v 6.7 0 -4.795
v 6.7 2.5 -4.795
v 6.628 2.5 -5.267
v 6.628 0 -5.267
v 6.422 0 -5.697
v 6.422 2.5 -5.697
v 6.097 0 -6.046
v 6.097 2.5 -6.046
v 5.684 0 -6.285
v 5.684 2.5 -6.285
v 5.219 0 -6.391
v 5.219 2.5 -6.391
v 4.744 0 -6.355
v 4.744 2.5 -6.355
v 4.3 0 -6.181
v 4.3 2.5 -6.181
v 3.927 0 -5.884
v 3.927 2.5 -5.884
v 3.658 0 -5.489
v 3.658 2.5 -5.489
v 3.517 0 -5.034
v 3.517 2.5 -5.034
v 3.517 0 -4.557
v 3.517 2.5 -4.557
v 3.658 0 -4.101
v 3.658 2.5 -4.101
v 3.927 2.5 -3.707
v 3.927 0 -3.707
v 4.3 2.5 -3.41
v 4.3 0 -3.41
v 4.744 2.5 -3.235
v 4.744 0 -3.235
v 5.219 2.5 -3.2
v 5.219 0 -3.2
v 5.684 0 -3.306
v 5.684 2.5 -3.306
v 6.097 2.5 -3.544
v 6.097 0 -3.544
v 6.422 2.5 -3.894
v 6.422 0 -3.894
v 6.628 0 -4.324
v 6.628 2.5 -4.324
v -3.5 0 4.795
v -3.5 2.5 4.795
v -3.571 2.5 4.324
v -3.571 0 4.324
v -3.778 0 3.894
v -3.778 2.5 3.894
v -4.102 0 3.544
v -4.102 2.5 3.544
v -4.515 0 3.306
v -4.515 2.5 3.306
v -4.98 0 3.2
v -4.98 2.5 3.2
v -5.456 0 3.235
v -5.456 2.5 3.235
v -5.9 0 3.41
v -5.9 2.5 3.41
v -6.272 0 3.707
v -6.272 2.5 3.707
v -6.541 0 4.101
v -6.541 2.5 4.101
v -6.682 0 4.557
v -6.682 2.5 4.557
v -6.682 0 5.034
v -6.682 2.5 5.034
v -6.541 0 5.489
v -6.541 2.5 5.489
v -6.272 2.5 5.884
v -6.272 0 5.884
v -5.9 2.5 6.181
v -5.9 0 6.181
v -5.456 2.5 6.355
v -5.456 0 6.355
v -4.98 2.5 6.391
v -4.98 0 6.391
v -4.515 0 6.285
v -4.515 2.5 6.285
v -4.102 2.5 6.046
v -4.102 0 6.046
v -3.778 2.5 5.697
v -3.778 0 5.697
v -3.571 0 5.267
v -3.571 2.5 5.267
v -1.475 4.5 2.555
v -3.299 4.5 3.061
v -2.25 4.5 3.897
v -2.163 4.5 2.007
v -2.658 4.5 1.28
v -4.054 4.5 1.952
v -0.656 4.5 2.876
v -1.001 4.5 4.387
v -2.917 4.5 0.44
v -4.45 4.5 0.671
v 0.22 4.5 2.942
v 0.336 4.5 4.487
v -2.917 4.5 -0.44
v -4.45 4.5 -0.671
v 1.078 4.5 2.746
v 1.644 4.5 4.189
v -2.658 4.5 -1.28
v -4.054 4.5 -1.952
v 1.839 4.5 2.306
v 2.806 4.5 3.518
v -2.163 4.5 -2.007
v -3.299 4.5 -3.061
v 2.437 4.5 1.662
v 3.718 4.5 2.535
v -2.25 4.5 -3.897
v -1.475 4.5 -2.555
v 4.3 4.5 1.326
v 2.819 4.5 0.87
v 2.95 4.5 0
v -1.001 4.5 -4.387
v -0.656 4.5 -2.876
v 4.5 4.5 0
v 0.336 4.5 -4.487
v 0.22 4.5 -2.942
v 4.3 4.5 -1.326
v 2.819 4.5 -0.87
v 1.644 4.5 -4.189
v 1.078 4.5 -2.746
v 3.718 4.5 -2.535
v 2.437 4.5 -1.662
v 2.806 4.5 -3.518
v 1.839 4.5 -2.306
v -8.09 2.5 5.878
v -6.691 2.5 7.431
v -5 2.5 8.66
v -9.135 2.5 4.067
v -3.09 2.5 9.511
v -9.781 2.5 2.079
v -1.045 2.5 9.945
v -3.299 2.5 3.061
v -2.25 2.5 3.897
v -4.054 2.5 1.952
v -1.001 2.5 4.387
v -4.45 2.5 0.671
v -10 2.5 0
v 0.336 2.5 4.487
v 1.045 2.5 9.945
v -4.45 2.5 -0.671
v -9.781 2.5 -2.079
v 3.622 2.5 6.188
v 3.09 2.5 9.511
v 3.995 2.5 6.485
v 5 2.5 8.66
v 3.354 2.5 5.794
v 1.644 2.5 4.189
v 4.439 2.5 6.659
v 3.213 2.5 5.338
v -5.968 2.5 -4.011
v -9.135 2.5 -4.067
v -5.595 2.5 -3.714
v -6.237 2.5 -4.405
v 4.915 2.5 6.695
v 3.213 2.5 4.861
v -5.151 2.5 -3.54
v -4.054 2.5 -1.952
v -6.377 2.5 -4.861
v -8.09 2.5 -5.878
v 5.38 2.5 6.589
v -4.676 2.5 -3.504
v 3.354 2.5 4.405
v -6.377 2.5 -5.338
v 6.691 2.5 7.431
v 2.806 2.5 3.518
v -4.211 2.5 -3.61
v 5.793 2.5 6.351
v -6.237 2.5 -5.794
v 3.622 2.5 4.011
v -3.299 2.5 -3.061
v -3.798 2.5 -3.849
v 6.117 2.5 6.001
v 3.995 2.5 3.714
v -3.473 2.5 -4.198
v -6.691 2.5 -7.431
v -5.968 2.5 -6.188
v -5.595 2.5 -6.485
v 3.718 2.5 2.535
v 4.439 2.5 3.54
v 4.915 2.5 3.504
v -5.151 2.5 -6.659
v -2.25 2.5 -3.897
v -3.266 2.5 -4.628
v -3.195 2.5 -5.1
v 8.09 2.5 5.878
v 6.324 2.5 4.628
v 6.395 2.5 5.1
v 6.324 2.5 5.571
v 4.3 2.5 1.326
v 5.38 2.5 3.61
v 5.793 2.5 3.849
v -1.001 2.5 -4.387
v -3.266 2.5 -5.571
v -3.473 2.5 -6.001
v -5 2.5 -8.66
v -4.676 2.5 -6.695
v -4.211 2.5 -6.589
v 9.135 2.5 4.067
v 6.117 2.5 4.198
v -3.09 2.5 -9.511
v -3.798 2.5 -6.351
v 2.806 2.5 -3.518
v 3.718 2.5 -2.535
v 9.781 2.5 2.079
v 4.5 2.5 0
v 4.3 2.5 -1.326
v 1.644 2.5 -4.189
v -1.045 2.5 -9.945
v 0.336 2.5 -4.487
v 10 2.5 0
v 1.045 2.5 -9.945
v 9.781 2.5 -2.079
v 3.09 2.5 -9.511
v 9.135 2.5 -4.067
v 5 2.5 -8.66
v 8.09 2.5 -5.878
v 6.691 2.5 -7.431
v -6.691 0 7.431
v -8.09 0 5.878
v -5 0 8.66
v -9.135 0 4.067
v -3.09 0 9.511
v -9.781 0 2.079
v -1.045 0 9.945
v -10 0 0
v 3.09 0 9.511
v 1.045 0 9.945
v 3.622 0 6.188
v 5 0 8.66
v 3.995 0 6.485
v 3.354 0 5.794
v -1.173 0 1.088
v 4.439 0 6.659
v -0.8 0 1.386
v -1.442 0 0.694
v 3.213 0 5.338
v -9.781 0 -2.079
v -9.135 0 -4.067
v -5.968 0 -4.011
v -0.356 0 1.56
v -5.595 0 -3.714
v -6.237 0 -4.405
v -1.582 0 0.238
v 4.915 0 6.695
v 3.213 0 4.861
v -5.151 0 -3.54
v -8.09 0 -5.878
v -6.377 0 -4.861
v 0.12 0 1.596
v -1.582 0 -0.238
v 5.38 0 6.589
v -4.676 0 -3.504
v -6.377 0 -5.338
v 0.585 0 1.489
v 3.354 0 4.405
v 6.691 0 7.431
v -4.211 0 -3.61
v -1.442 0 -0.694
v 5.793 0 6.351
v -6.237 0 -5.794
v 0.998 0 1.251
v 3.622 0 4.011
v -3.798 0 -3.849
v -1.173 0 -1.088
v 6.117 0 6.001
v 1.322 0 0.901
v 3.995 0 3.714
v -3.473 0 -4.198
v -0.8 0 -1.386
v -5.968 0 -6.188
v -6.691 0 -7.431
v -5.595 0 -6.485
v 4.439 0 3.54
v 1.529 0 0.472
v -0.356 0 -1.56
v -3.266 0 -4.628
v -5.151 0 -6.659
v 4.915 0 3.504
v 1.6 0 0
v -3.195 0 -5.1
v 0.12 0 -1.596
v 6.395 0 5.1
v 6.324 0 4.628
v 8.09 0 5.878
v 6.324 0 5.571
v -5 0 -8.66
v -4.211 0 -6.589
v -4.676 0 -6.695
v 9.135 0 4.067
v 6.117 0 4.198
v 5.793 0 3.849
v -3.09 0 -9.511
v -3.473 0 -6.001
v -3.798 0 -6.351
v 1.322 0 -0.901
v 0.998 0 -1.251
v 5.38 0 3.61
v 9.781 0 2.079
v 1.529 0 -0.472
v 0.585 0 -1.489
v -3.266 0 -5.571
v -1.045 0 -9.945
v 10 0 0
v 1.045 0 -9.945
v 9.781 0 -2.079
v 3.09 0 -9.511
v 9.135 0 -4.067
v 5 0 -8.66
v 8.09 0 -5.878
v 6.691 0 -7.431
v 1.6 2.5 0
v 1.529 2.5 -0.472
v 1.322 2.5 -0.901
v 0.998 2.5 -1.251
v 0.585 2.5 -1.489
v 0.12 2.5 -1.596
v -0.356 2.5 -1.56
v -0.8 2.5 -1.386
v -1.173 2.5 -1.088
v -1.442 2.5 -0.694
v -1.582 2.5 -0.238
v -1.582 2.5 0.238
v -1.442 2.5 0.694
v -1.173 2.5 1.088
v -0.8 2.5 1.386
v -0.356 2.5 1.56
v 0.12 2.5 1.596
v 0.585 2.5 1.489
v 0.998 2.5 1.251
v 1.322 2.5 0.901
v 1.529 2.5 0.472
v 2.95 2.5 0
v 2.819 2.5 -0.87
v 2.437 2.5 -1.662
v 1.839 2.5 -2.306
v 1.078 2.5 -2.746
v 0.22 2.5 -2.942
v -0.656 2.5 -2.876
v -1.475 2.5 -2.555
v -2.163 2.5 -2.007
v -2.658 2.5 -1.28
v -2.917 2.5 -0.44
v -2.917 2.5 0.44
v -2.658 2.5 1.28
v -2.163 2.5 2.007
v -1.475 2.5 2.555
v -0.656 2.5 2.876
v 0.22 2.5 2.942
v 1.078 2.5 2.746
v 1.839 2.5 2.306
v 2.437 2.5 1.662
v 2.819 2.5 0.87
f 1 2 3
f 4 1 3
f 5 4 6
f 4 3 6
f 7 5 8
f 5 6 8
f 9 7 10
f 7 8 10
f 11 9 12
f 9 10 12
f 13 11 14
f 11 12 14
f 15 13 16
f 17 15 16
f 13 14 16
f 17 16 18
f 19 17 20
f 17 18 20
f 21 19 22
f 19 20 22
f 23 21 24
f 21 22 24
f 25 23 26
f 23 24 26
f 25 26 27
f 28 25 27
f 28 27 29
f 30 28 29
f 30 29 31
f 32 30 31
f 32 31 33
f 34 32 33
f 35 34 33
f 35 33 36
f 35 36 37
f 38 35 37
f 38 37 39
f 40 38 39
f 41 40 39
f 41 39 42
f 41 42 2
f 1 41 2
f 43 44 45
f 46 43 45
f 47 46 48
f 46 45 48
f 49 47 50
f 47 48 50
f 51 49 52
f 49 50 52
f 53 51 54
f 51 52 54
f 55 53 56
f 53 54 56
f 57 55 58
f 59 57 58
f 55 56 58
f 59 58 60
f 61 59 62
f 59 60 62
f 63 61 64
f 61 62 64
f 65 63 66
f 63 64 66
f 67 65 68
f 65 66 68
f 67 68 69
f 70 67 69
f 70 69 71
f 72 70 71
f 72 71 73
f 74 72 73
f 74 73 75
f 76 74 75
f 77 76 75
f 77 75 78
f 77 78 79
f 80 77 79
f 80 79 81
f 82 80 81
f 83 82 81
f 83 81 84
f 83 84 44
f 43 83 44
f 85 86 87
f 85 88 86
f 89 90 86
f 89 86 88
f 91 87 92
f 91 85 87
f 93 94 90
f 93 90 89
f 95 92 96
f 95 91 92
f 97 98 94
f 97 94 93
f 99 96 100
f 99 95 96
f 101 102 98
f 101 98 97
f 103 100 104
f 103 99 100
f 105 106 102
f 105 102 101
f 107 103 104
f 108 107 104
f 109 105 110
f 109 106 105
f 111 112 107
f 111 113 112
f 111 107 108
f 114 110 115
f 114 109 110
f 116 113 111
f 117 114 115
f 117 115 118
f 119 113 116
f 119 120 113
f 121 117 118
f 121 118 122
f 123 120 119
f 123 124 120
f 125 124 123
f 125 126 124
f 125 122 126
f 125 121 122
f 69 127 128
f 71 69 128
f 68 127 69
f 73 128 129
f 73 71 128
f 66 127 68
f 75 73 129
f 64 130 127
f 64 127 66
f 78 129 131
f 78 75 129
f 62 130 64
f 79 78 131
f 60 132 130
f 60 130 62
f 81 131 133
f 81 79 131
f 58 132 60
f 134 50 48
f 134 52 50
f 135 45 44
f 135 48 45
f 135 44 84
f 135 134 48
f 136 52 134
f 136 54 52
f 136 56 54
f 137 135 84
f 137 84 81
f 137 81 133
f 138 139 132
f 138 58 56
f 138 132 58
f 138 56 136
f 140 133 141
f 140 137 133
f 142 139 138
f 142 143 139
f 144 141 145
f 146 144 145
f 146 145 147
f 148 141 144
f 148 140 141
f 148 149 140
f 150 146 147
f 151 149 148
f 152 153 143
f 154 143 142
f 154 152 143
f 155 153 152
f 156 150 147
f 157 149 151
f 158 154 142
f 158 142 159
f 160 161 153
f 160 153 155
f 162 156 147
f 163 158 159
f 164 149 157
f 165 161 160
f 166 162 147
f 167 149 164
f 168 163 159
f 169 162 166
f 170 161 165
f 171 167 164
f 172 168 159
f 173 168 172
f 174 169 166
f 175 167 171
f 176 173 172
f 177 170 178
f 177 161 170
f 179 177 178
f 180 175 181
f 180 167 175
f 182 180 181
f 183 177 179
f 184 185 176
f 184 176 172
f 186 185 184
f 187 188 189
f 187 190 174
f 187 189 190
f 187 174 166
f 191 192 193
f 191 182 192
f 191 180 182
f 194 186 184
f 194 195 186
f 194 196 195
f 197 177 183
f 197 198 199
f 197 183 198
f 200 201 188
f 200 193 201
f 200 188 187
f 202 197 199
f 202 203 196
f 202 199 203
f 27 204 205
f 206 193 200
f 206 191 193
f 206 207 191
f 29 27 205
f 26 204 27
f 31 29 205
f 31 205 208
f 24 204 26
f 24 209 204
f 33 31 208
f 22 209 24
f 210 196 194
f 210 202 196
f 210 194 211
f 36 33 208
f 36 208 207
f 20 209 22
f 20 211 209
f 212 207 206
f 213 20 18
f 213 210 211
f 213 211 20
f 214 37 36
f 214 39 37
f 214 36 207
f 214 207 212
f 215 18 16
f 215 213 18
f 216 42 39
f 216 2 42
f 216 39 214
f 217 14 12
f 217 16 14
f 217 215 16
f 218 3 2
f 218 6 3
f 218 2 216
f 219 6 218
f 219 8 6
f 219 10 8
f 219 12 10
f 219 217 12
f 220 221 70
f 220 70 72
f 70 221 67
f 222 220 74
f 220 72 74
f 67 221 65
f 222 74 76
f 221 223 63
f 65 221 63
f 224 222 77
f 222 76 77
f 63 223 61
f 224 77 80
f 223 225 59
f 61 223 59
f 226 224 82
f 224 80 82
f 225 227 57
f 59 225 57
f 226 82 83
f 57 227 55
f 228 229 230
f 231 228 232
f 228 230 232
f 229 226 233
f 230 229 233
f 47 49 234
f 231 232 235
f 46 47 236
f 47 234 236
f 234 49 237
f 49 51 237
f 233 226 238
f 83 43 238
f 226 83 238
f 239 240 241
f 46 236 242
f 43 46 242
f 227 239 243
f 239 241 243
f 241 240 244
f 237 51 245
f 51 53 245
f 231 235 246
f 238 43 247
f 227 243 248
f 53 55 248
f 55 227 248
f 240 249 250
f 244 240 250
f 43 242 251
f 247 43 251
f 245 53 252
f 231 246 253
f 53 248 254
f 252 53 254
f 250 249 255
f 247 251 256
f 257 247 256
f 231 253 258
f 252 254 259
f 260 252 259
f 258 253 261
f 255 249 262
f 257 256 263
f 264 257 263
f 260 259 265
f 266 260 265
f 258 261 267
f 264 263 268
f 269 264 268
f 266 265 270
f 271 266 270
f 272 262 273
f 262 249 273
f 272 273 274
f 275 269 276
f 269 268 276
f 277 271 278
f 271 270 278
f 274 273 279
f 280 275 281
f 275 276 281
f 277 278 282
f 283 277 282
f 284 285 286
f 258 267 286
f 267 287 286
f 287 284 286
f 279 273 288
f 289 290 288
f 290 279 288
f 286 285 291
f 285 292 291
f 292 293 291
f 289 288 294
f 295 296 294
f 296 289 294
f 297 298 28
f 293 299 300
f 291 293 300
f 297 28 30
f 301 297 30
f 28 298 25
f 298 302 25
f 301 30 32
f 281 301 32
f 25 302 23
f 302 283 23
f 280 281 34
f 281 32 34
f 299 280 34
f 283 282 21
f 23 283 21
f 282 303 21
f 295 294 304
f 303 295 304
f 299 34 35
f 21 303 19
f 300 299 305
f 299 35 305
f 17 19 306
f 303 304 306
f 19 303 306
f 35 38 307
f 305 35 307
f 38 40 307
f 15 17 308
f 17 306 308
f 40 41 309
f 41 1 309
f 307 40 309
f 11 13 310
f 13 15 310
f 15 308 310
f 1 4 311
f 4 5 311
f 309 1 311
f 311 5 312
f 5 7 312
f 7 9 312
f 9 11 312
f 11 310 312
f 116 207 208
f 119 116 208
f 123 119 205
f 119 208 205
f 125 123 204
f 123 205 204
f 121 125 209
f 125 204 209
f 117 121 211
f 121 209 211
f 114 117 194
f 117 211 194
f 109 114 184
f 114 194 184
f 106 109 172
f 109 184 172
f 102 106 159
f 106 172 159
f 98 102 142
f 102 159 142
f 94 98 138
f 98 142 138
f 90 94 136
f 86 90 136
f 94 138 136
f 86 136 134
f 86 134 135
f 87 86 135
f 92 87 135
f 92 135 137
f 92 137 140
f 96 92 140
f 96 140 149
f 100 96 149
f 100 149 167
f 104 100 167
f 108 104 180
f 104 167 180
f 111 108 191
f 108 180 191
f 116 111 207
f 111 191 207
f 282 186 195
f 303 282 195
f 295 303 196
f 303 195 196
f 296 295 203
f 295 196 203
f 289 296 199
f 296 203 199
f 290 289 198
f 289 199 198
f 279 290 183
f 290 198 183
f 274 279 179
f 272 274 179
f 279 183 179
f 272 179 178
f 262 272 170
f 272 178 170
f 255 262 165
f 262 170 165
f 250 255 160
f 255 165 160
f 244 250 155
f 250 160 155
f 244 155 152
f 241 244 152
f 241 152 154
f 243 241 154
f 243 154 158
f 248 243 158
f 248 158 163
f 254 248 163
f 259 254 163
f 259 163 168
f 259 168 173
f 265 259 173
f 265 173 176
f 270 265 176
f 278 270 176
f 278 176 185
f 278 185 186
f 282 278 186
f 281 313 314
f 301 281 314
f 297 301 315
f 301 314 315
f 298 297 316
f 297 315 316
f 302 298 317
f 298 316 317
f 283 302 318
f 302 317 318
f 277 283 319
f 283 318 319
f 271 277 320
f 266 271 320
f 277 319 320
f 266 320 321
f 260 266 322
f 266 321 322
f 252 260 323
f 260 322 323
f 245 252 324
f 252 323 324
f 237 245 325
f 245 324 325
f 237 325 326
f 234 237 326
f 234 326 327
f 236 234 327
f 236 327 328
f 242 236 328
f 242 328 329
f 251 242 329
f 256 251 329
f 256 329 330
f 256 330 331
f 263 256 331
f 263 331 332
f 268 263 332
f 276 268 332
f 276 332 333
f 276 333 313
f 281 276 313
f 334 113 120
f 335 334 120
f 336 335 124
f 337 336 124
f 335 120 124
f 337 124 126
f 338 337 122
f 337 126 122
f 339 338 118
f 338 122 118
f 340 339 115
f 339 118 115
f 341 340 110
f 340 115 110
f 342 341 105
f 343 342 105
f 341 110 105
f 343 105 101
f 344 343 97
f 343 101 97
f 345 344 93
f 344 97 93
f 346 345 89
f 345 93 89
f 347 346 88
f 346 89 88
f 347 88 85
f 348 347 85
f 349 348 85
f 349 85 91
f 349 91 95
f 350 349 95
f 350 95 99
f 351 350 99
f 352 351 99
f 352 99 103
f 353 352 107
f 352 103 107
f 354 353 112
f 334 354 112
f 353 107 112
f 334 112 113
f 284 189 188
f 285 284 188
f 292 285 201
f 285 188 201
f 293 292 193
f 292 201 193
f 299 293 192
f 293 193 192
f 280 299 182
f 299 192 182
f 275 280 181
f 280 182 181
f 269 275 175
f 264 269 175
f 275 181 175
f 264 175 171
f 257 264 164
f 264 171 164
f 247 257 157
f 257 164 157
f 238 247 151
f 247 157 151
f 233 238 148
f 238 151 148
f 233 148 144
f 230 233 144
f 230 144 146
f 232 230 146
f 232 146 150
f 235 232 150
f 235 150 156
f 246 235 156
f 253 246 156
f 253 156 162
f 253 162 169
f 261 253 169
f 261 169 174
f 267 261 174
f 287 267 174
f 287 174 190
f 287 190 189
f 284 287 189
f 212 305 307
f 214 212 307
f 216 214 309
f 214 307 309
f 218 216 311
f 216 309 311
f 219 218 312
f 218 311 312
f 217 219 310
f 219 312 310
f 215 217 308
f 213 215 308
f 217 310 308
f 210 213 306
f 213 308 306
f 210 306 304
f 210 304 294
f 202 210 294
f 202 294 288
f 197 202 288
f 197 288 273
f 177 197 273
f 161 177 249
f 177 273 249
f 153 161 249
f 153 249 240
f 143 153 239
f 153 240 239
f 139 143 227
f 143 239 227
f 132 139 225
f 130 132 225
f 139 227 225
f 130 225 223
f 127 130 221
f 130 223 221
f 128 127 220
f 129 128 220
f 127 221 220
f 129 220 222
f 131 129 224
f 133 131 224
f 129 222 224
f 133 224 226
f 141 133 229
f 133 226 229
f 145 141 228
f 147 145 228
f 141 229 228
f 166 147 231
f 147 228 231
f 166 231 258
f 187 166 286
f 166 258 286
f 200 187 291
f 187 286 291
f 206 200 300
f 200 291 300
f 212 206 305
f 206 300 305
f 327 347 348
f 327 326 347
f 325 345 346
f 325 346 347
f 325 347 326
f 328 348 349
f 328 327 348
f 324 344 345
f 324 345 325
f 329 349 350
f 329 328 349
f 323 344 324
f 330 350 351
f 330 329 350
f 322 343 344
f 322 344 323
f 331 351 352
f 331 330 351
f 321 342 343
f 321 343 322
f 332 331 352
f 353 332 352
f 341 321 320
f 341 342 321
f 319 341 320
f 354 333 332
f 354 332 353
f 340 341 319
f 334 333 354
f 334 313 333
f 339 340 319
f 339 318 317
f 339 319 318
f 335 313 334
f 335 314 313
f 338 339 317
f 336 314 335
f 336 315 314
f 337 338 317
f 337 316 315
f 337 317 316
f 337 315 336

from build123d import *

# Parameters (mm, degrees)
SKETCH_1_R          = 10
EXTRUDE_1_DEPTH     = 2.5
SKETCH_3_R          = 1.6
CUT_EXTRUDE_1_DEPTH = 3.5
SKETCH_4_R          = 4.5
EXTRUDE_2_DEPTH     = 2
SKETCH_5_R          = 2.95
CUT_EXTRUDE_2_DEPTH = 2


with BuildPart() as part:
    # 草图1 → 凸台-拉伸1 (new body)
    with BuildSketch(Plane(origin=(0, 0, 0), x_dir=(1, 0, 0), z_dir=(0, 1, 0))):
        Circle(SKETCH_1_R)
    extrude(amount=EXTRUDE_1_DEPTH)

    # 草图3 → 切除-拉伸1 (cut, through all)
    with BuildSketch(Plane(origin=(0, 2.5, 0), x_dir=(1, 0, 0), z_dir=(0, 1, 0))):
        with Locations((-4.795236977, 5.099578643)):
            Circle(SKETCH_3_R)
        with Locations((-5.099578643, -4.795236977)):
            Circle(SKETCH_3_R)
        with Locations((4.795236977, -5.099578643)):
            Circle(SKETCH_3_R)
        with Locations((5.099578643, 4.795236977)):
            Circle(SKETCH_3_R)
        Circle(SKETCH_3_R)
    extrude(amount=-CUT_EXTRUDE_1_DEPTH, mode=Mode.SUBTRACT)

    # 草图4 → 凸台-拉伸2 (add)
    with BuildSketch(Plane(origin=(0, 2.5, 0), x_dir=(1, 0, 0), z_dir=(0, 1, 0))):
        Circle(SKETCH_4_R)
    extrude(amount=EXTRUDE_2_DEPTH)

    # 草图5 → 切除-拉伸2 (cut)
    with BuildSketch(Plane(origin=(0, 4.5, 0), x_dir=(1, 0, 0), z_dir=(0, 1, 0))):
        Circle(SKETCH_5_R)
    extrude(amount=-CUT_EXTRUDE_2_DEPTH, mode=Mode.SUBTRACT)


solid = part.part
